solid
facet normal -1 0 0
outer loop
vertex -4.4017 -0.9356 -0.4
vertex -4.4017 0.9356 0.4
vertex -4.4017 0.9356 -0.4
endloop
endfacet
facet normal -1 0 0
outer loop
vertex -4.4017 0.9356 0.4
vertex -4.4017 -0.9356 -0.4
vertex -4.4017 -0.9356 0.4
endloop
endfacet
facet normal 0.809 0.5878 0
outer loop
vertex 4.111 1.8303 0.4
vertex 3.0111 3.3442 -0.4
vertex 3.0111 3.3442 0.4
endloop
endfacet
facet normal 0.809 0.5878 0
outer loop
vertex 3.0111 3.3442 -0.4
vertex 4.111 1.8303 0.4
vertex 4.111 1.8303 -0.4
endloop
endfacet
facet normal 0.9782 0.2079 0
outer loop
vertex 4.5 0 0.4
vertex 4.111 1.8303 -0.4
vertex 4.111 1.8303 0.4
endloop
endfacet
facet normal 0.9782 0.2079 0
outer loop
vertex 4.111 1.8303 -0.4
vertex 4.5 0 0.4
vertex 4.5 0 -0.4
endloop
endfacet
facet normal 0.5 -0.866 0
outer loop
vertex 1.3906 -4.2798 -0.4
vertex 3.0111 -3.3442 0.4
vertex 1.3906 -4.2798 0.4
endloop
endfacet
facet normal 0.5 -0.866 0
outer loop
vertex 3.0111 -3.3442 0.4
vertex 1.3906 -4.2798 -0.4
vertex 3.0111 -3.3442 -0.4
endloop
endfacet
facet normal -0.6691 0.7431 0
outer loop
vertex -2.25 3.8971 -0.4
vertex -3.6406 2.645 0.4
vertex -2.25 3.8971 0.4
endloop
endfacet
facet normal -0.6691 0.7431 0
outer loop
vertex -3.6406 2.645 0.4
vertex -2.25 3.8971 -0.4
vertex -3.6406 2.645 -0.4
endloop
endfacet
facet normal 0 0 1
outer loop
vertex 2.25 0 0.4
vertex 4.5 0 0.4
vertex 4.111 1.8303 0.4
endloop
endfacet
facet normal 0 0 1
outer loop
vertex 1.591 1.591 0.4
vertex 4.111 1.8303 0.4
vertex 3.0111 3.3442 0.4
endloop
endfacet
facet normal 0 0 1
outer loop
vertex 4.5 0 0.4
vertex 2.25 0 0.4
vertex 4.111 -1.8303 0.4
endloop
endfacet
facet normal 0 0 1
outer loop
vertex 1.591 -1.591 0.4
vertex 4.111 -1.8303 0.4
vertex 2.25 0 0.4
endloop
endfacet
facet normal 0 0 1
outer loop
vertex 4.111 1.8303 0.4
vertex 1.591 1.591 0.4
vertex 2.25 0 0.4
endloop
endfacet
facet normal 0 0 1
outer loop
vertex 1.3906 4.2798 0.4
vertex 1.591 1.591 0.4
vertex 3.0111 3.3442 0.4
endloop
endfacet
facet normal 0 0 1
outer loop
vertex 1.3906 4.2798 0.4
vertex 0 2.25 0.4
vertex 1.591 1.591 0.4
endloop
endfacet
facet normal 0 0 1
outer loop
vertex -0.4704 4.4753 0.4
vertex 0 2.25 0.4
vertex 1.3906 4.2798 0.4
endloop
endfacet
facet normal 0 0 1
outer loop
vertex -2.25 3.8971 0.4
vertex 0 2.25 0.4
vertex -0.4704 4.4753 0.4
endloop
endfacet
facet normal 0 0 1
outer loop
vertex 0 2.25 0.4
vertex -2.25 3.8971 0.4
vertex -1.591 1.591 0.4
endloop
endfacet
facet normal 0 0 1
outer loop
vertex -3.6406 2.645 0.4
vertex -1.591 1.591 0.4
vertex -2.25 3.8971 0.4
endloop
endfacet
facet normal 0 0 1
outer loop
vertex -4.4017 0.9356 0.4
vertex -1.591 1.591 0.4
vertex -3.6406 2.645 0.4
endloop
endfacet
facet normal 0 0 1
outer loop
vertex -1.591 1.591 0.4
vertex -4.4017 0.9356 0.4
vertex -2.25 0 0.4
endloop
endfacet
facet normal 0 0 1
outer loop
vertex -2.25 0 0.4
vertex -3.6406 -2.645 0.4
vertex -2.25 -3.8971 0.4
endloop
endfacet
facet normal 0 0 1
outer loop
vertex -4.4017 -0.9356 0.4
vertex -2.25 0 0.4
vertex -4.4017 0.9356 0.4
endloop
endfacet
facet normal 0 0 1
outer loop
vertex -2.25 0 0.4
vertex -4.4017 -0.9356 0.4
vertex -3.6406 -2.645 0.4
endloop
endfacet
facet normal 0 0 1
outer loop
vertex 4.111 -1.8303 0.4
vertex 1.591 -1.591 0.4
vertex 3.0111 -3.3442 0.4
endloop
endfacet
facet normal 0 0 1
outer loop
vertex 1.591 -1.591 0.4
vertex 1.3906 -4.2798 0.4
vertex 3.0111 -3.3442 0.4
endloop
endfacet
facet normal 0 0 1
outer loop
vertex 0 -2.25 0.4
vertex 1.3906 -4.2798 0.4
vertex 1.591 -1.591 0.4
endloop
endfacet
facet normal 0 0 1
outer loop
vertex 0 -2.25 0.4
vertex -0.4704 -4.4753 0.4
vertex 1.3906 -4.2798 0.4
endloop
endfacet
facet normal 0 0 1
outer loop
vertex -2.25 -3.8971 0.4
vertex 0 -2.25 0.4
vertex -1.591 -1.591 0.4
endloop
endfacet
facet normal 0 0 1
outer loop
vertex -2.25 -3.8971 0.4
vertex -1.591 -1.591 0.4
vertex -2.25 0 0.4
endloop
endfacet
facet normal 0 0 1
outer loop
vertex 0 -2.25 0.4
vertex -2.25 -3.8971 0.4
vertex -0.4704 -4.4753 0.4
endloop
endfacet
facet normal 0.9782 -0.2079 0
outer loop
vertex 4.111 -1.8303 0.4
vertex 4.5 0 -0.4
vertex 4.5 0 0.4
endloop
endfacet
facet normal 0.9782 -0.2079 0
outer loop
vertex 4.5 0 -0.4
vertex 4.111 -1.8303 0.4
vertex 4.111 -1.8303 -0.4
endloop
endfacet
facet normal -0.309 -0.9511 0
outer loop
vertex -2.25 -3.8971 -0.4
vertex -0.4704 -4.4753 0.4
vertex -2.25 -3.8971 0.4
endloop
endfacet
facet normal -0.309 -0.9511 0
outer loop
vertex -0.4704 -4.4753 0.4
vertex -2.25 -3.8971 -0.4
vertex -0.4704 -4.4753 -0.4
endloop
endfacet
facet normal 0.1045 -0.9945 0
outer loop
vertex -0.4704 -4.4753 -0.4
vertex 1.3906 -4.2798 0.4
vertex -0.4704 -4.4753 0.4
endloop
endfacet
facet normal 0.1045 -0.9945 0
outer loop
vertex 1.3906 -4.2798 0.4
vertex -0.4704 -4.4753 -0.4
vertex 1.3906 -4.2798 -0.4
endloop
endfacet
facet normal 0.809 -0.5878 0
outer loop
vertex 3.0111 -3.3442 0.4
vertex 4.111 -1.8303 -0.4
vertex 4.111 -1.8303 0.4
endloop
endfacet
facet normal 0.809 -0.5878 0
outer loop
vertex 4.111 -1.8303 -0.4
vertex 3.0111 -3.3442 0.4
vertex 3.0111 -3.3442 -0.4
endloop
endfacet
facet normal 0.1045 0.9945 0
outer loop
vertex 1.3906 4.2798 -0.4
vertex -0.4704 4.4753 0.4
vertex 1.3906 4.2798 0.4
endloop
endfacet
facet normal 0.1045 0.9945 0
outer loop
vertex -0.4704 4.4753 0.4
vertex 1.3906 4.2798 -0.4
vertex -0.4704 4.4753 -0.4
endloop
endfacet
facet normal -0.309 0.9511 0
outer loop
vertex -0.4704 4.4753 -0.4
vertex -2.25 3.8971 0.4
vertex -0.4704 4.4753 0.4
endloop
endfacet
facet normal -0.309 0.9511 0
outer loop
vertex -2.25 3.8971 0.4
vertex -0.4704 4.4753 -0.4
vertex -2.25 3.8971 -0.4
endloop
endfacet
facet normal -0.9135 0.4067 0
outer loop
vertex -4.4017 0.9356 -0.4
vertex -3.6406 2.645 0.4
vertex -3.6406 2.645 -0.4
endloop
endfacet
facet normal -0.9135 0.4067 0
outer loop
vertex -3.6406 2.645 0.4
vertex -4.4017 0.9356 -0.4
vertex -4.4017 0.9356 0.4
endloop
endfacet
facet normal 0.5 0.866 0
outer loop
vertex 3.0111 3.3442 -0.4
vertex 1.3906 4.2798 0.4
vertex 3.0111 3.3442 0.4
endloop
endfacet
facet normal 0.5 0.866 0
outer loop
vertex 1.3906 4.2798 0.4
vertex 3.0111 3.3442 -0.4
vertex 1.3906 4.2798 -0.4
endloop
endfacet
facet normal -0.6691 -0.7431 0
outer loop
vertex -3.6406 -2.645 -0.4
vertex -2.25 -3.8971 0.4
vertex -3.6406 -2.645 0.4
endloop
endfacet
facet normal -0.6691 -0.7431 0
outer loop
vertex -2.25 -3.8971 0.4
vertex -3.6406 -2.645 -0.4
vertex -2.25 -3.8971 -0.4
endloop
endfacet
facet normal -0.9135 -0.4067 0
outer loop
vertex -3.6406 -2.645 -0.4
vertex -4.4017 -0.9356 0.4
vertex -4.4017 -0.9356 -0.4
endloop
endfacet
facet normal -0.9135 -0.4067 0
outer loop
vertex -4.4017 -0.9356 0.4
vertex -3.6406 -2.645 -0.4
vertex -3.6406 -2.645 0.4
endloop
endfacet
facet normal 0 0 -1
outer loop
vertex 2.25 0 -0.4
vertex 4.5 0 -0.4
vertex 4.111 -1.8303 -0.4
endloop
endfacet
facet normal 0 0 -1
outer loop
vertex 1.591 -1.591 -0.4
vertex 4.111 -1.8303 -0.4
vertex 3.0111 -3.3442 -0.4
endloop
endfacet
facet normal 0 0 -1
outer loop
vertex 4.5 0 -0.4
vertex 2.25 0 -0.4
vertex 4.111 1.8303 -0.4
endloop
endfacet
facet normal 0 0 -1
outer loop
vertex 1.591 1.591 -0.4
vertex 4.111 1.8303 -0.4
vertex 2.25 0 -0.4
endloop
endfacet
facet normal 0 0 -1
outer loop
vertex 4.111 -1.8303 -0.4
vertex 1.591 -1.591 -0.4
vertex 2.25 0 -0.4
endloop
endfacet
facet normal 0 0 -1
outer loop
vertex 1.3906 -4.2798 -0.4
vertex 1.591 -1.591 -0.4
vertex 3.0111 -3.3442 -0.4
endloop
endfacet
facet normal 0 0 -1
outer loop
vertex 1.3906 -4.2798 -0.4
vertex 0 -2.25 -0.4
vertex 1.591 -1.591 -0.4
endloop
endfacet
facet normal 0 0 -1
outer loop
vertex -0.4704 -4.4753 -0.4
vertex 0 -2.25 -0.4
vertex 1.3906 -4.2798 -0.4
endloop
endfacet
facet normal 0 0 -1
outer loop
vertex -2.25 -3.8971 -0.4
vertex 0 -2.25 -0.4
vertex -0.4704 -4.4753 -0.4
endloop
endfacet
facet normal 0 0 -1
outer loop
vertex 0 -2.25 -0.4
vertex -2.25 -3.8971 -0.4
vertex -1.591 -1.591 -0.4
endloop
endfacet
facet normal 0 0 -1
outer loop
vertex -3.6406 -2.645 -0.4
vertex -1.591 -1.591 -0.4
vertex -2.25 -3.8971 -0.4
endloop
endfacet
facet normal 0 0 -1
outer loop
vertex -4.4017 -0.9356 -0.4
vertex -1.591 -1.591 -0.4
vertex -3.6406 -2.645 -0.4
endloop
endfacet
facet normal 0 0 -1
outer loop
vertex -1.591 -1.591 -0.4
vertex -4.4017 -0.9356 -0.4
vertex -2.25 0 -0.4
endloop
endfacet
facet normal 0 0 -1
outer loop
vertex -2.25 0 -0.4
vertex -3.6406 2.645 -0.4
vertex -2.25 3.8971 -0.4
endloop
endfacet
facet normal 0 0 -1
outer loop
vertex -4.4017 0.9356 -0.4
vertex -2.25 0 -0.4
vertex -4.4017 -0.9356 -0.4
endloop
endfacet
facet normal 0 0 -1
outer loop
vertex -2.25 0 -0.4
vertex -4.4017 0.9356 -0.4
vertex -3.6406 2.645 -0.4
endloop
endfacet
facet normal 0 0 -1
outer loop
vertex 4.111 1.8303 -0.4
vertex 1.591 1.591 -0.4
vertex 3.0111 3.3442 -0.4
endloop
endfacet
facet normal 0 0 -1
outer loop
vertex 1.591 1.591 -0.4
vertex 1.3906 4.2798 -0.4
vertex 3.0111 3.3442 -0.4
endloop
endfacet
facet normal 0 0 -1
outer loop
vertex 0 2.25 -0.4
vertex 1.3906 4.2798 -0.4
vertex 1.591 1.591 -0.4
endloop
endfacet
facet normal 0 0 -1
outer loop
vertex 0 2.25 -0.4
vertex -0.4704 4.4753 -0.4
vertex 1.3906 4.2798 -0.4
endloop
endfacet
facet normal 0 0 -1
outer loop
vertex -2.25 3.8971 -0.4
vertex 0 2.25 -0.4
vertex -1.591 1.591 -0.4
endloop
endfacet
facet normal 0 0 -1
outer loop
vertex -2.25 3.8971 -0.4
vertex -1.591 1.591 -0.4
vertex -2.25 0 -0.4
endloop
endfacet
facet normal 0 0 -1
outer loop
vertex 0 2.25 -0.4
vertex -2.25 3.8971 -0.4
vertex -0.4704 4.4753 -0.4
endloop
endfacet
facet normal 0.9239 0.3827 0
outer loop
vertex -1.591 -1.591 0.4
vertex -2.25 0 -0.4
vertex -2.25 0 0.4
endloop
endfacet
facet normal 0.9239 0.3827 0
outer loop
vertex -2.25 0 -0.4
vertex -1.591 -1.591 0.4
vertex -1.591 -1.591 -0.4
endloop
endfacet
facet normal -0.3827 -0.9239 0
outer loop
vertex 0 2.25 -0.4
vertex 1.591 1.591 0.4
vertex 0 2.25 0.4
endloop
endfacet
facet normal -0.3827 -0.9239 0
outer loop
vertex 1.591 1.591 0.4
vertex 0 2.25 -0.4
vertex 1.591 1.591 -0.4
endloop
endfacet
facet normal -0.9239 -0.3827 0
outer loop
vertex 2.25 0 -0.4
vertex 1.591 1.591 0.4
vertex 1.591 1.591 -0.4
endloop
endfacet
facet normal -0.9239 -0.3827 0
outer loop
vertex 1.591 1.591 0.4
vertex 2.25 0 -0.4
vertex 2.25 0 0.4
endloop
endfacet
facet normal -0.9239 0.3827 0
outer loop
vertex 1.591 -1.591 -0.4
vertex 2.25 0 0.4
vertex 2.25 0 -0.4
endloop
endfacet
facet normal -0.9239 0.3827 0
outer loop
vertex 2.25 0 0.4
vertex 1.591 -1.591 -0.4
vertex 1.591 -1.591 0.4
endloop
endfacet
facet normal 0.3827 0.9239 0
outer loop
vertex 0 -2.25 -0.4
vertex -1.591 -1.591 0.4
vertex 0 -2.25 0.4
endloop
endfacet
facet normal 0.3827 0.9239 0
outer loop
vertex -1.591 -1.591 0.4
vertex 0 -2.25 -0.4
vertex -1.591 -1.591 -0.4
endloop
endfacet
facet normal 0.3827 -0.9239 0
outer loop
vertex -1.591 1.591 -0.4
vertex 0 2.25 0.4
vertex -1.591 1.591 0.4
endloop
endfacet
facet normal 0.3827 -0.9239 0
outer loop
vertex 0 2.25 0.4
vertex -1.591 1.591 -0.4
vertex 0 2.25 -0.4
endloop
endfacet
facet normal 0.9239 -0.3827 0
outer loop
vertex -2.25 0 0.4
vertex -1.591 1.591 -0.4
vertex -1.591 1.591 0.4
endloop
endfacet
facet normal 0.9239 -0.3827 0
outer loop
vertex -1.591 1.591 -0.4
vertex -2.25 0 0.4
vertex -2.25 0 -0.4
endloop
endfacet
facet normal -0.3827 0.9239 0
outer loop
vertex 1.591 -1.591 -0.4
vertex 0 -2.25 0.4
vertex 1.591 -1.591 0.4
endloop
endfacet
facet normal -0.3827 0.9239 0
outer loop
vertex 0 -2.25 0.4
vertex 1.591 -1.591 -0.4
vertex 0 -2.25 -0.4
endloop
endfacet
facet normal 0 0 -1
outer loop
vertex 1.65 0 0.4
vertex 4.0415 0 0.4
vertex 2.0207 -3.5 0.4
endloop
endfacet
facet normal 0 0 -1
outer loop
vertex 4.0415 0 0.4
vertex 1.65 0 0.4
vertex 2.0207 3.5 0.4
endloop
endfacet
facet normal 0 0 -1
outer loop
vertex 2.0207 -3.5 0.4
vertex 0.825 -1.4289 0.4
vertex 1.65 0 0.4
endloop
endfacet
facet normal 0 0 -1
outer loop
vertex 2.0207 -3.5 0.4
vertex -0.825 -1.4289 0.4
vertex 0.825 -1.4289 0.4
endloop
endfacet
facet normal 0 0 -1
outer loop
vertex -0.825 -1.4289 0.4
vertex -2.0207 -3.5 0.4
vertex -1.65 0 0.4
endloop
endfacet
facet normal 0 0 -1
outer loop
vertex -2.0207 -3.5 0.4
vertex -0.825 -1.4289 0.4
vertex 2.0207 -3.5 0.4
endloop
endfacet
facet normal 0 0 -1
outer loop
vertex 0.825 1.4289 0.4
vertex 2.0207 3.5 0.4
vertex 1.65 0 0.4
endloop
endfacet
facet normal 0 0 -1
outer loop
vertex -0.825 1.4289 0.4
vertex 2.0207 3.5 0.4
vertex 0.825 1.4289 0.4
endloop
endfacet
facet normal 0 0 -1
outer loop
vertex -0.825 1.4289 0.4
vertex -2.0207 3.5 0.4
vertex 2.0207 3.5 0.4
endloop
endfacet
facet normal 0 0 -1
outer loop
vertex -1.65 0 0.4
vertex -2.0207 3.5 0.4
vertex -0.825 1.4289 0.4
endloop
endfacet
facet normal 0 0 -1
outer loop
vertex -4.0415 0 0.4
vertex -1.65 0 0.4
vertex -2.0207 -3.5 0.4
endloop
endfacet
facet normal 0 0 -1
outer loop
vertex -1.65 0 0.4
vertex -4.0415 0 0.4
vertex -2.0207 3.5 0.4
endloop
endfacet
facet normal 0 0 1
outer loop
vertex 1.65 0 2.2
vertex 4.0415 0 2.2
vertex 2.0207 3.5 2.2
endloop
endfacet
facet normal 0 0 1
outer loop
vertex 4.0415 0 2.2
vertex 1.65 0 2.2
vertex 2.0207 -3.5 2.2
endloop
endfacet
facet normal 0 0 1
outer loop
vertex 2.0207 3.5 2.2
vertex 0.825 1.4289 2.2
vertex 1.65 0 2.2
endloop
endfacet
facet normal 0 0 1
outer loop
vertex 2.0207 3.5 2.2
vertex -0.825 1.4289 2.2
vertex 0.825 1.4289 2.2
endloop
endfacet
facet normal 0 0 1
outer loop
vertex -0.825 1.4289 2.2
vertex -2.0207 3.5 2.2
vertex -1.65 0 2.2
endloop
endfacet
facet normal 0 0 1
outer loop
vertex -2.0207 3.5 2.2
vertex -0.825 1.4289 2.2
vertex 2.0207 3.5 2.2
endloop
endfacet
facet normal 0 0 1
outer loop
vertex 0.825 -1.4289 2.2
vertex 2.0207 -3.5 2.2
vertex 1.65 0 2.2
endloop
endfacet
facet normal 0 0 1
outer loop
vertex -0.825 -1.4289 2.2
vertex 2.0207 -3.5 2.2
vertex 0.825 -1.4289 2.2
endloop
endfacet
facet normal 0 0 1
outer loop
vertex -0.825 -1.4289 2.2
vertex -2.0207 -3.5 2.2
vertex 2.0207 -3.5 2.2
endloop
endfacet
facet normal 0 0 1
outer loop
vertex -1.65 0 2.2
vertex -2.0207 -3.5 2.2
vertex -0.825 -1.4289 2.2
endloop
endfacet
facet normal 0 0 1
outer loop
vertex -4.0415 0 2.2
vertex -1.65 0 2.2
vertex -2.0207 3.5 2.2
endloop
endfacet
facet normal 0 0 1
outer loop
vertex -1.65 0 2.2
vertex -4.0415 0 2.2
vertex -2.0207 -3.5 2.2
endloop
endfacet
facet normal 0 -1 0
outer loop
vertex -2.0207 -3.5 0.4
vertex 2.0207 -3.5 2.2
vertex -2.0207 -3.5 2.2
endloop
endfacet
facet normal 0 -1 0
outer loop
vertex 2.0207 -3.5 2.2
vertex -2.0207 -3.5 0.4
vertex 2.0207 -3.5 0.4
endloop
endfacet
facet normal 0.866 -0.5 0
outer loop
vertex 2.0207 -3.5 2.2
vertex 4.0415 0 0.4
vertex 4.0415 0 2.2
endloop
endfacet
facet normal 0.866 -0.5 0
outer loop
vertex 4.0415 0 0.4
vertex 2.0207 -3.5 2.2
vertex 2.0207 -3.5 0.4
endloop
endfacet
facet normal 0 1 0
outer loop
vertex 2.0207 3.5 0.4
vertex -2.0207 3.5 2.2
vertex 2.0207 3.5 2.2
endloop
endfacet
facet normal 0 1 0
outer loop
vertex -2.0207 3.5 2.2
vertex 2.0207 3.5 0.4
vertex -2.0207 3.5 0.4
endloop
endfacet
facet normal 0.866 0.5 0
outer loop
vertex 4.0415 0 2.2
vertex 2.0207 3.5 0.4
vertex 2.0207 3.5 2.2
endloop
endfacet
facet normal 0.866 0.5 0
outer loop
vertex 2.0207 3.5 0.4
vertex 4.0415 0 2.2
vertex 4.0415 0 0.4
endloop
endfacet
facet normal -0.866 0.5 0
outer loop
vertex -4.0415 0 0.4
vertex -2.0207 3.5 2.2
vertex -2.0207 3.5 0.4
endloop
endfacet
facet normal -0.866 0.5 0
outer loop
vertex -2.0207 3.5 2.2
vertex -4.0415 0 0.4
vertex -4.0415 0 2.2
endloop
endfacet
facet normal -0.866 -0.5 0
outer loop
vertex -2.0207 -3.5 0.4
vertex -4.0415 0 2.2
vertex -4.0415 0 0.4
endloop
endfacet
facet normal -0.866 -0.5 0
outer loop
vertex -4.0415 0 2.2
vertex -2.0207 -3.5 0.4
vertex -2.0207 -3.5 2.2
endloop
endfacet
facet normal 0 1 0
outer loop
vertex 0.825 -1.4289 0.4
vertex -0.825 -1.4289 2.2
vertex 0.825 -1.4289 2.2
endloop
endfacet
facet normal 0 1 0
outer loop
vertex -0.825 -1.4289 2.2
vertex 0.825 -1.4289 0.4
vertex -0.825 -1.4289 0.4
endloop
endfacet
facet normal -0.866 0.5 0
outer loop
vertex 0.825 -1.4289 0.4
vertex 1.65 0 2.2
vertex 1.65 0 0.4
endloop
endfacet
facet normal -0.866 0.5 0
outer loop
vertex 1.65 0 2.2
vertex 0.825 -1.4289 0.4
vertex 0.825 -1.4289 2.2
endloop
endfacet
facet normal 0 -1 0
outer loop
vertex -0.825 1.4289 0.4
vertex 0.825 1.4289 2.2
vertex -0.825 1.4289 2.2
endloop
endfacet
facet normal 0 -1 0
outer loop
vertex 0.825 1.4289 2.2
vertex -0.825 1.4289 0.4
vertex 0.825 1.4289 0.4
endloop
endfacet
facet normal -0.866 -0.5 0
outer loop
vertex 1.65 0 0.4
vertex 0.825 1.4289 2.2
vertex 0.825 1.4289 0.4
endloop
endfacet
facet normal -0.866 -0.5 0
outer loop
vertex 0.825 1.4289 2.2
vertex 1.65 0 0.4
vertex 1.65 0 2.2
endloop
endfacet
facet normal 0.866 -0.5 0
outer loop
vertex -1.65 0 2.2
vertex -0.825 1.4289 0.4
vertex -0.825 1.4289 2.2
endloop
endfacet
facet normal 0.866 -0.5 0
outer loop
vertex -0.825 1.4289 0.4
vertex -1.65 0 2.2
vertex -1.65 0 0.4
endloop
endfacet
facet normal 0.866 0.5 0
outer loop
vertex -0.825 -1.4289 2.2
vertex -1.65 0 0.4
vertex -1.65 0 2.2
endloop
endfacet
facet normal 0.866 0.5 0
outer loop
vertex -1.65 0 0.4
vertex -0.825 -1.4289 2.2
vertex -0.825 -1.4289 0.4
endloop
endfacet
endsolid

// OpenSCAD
// Parameters
thread_nominal_diameter = 4; //[2:8:0.1]
across_flats = 7; //[3.5:14:0.1]
thickness = 2.2; //[1.1:4.4:0.1]
thread_pitch = 0.7; //[0.35:1.4:0.05]
hole_diameter_mode = 0; //[0:1:1]
clearance_hole_diameter = 4.3; //[3.5:6:0.05]
thread_tap_drill_diameter = 3.3; //[2.5:4.2:0.05]
chamfer_size = 0.2; //[0.1:0.6:0.05]
eps = 0.2; //[0.05:0.5:0.05]
washer_outer_diameter = 9; //[4.5:18:0.1]
washer_thickness = 0.8; //[0.4:1.6:0.05]
washer_hole_diameter = 4.5; //[3.5:6.5:0.05]

// Hex Nut with Chamfers
module hex_nut() {
  difference() {
    // Hexagonal nut body
    color("DimGray") {
      cylinder(h=thickness, r=across_flats/(2*cos(30)), center=true, $fn=6);
    }
    // Central hole
    cylinder(h=thickness + 2*eps, r=((1-hole_diameter_mode)*thread_tap_drill_diameter + hole_diameter_mode*clearance_hole_diameter)/2, center=true);
    // Top and bottom chamfers
    for (z = [-thickness/2, thickness/2]) {
      translate([0, 0, z])
        cylinder(h=2*chamfer_size, r=across_flats/(2*cos(30)) + eps, center=true, $fn=6);
    }
  }
}

// Washer
module washer() {
  difference() {
    // Outer washer
    color("Silver") {
      cylinder(h=washer_thickness, r=washer_outer_diameter/2, center=true);
    }
    // Inner hole
    cylinder(h=washer_thickness + 2*eps, r=washer_hole_diameter/2, center=true);
  }
}

// Nut and Washer Assembly
module nut_and_washer() {
  union() {
    washer();
    translate([0, 0, washer_thickness/2 + thickness/2 - eps])
      hex_nut();
  }
}

// Final Assembly
module assembly() {
  nut_and_washer();
}

assembly();
